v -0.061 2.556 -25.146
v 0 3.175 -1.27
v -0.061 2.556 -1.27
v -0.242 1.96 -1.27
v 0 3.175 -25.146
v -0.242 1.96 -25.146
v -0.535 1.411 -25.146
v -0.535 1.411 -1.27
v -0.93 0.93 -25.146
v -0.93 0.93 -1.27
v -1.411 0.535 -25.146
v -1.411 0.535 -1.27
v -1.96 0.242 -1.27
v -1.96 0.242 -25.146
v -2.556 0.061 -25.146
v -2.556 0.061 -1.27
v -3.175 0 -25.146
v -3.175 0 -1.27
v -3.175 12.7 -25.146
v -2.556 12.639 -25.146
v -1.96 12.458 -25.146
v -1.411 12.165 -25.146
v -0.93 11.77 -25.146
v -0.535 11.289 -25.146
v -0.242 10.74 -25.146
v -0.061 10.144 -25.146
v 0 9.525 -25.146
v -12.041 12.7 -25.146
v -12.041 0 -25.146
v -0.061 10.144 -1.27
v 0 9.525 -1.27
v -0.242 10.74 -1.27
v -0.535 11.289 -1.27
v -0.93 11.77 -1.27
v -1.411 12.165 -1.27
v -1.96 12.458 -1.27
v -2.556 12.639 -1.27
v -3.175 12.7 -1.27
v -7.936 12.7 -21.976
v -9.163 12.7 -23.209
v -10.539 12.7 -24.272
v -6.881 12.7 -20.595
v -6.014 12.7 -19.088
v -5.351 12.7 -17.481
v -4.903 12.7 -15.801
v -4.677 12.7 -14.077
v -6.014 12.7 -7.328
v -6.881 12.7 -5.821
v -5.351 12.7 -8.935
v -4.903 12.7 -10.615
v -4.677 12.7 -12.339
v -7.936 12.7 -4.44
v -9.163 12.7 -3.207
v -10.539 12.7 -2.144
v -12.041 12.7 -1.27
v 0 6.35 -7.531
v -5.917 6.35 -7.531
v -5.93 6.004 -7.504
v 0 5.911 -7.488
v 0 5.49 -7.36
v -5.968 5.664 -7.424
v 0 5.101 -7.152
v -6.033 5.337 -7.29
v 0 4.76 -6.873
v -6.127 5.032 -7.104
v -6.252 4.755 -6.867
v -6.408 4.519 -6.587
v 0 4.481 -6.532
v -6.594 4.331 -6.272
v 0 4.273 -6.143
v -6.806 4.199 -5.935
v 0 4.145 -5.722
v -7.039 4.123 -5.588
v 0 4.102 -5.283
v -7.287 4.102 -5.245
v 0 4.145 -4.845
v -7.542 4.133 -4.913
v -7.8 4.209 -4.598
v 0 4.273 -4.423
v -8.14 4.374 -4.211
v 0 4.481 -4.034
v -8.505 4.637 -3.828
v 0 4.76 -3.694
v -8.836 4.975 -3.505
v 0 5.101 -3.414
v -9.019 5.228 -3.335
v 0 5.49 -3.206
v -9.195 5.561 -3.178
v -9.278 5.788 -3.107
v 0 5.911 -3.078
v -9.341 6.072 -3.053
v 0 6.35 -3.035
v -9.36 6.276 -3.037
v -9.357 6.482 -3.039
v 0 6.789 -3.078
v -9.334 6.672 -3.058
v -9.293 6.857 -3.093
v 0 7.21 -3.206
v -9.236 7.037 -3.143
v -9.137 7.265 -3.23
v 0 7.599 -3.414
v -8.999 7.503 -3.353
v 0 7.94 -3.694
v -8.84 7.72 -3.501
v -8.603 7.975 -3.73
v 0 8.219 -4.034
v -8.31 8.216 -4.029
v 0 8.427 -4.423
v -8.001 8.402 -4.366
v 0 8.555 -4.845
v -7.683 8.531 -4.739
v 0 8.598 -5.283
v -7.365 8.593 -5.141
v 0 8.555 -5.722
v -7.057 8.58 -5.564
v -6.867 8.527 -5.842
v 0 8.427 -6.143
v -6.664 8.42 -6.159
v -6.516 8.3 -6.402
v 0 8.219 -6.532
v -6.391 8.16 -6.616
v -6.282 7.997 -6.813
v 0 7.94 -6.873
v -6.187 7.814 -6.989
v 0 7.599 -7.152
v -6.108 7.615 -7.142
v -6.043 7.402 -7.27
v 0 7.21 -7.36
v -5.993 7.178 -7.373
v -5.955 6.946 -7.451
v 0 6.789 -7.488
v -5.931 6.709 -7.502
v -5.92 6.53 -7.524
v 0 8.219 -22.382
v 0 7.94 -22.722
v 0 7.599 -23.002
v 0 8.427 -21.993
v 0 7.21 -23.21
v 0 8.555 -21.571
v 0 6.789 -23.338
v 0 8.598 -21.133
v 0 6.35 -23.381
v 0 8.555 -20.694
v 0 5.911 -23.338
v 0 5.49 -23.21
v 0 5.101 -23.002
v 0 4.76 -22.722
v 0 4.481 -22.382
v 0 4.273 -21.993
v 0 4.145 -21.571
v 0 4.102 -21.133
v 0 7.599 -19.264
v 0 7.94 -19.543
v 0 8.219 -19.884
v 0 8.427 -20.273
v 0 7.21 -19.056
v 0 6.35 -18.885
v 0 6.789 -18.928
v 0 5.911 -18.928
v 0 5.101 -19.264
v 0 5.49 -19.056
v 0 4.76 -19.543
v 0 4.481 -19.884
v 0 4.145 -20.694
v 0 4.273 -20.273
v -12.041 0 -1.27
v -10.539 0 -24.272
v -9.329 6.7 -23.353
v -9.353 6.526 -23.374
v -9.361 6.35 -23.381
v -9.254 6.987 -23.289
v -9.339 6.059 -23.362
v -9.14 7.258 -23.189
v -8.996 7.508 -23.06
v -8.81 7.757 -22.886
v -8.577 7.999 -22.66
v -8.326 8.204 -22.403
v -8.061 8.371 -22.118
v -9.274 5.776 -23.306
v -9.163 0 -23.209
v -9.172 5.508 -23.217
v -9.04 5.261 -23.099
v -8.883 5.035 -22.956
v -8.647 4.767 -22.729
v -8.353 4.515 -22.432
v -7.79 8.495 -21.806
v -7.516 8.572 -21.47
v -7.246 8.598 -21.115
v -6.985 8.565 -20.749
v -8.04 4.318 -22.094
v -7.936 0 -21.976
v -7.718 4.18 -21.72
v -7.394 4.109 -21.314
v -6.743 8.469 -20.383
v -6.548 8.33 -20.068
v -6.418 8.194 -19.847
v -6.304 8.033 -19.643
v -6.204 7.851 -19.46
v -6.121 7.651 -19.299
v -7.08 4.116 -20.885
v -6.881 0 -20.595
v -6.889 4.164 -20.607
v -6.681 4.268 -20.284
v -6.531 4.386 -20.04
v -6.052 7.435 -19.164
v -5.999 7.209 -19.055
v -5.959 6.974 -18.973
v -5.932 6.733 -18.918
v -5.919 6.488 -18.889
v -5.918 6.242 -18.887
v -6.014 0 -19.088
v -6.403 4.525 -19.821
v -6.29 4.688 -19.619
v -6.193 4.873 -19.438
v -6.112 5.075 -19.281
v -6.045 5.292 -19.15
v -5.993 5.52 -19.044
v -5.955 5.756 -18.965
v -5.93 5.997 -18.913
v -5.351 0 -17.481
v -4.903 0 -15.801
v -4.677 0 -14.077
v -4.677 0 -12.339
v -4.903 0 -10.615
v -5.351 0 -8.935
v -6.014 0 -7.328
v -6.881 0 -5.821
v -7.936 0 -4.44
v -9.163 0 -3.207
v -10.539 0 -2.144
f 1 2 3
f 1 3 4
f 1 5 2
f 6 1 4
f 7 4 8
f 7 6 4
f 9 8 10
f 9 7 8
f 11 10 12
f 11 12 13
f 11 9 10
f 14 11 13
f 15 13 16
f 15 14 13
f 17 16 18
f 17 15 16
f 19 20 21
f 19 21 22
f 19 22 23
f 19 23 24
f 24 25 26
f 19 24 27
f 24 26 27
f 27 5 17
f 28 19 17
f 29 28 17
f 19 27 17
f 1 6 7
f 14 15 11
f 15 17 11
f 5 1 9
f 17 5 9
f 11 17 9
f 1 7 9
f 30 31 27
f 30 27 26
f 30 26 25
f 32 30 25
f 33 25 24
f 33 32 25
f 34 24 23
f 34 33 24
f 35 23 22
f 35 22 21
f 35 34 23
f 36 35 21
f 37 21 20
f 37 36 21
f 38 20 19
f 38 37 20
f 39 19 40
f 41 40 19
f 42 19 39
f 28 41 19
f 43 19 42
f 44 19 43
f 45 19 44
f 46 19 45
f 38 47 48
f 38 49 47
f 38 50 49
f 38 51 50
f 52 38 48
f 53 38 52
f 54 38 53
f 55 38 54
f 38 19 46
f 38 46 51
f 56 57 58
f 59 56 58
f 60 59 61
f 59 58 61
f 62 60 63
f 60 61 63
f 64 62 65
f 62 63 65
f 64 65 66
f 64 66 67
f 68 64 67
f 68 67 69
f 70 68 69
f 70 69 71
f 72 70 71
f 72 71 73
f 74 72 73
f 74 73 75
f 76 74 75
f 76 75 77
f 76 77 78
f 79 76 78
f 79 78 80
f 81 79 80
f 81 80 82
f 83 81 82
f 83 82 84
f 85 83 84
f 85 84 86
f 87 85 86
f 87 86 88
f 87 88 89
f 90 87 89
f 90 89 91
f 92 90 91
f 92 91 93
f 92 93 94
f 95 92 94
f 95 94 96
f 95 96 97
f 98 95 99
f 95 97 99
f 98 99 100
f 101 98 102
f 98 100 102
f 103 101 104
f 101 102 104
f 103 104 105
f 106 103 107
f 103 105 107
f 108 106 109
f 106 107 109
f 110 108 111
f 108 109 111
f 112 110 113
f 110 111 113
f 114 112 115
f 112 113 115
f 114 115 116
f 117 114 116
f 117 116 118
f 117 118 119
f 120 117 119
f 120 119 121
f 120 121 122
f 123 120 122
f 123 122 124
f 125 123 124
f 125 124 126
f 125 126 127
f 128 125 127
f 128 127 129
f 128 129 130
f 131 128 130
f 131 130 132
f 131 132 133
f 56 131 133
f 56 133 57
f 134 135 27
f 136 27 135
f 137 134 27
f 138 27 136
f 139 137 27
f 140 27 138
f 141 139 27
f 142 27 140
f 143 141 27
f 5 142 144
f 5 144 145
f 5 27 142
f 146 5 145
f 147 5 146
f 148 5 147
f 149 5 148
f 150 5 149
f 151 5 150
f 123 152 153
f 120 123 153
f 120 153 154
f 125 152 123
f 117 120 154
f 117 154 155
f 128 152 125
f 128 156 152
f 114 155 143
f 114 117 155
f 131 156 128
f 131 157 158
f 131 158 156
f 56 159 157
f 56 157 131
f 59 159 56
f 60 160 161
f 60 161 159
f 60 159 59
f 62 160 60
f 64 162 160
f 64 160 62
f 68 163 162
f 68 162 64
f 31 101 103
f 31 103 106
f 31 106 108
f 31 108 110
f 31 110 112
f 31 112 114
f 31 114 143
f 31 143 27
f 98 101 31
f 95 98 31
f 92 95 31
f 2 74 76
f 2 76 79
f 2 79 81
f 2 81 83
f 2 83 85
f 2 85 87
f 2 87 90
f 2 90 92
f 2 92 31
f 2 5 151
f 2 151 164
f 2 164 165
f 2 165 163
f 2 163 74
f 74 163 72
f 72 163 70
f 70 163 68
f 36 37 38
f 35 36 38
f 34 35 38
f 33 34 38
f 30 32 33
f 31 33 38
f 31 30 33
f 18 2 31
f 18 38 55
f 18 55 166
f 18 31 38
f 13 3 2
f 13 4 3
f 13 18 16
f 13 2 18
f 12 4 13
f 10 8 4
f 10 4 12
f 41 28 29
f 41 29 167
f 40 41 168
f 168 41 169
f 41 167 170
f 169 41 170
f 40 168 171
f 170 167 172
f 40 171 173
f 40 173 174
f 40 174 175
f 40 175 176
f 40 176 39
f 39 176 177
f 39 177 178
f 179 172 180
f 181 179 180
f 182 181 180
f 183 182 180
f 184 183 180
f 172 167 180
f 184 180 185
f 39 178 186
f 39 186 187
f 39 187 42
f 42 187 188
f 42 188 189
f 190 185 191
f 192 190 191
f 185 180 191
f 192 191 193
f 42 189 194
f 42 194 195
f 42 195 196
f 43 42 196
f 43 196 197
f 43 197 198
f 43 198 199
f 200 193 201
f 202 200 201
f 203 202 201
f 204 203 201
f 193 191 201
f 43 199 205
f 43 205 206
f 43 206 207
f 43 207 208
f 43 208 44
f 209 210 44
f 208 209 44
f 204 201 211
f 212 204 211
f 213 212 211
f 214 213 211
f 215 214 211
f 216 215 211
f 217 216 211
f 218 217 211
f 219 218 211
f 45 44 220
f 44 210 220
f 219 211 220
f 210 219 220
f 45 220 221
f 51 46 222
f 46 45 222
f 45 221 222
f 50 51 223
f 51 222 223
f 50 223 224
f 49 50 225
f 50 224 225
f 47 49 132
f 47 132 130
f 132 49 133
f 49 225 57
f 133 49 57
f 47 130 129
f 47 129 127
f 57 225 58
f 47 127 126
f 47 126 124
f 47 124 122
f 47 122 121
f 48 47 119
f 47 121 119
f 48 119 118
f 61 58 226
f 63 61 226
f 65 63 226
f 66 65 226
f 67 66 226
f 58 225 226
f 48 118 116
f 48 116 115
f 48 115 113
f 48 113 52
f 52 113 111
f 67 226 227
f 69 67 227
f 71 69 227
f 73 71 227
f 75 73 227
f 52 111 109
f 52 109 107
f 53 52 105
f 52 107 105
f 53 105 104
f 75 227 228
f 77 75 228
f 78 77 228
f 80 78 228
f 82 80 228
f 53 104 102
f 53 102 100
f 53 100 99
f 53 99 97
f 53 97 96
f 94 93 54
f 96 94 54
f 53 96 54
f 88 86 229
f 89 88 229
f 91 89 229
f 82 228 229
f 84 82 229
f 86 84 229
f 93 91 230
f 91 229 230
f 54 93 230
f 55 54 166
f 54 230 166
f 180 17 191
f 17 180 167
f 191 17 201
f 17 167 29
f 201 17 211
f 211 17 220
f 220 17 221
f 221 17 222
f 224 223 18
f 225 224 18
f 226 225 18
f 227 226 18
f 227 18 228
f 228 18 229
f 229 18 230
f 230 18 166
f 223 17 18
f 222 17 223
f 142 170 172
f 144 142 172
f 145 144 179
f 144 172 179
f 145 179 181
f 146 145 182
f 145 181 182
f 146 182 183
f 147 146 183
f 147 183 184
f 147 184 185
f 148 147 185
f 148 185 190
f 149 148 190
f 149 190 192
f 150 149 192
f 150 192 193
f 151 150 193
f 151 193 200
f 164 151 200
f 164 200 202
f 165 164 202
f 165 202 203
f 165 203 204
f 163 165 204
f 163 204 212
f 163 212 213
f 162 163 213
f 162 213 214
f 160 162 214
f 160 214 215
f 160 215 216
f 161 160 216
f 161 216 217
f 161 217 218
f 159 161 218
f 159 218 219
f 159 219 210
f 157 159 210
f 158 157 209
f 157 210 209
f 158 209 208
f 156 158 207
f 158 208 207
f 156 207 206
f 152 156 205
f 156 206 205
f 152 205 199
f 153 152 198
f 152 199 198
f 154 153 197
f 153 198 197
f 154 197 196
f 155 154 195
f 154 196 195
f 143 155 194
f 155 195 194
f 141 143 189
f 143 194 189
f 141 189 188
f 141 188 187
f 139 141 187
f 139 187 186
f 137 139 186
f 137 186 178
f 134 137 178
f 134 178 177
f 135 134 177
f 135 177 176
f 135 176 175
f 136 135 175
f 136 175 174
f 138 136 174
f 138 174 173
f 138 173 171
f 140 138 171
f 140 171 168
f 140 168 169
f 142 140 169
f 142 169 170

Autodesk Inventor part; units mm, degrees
ref_plane "YZ Plane" through (0, 0, 0) normal (1, 0, 0) x (0, 1, 0)
ref_plane "XZ Plane" through (0, 0, 0) normal (0, 1, 0) x (-1, 0, 0)
ref_plane "XY Plane" through (0, 0, 0) normal (0, 0, 1) x (1, 0, 0)
sketch "Sketch1" plane through (0, 0, 0) normal (0, 1, 0) x (-1, 0, 0)
  line L0 (0, 0) -> (26.416, 0)
  line L1 (26.416, 0) -> (26.416, -26.416)
  line L2 (26.416, -26.416) -> (0, -26.416)
  line L3 (0, -26.416) -> (0, 0)
  line L4 (0, -13.208) -> (17.9832, -13.208)
  line L5 (0, -13.208) -> (17.9832, -13.208) construction
  circle A0 centre (17.9832, -13.208) radius 13.335
  point P0 (16.1472, 0)
  point P1 (16.1472, -26.416)
  dimension "d0" = 26.416
  dimension "d1" = 26.416
  dimension "d2" = 17.9832
  dimension "d3" = 0
  dimension "d4" = 26.67
extrude "Extrusion1" add sketch "Sketch1" along normal blind 12.7 contours L0 A0 L4 L3 | L4 A0 L2 L3
sketch "Sketch2" plane through (0, 0, 0) normal (1, 0, 0) x (0, 0, -1)
  line L0 (0, 12.7) -> (26.416, 12.7) projected
  line L1 (13.208, 12.7) -> (13.208, 6.35)
  line L2 (13.208, 12.7) -> (19.558, 12.7) construction
  line L3 (13.208, 6.35) -> (21.1328, 6.35)
  line L4 (13.208, 6.35) -> (21.1328, 6.35) construction
  line L5 (13.208, 6.35) -> (5.2832, 6.35)
  line L6 (13.208, 6.35) -> (21.1328, 6.35) construction
  point P0 (0, 0)
  dimension "d7" = 6.35
  dimension "d8" = 90
  dimension "d9" = 7.9248
  dimension "d10" = 0
  dimension "d11" = 7.9248
  dimension "d12" = 180
hole "Hole1" at (0, 6.35, -5.2832) at (0, 6.35, -21.1328) direction (-1, 0, 0) diameter 4.4958 depth 35 clearance for "Flat Head Machine Screw (82)" size "#8" standard "Ansi Unified Screw Threads"
fillet "Fillet1" radius 3.175 2 edges at (0, 12.7, -13.208) (0, 0, -13.208)
sketch "Sketch3" plane through (0, 3.175, -26.416) normal (1, 0, 0) x (0, 0, -1)
  line L0 (-26.416, 9.525) -> (0, 9.525) projected
  line L1 (-26.416, -3.175) -> (0, -3.175) projected
  line L2 (-26.416, 9.525) -> (-25.146, 9.525)
  line L3 (-25.146, 9.525) -> (-25.146, -3.175)
  line L4 (-25.146, -3.175) -> (-26.416, -3.175)
  line L5 (-26.416, -3.175) -> (-26.416, 9.525)
  line L6 (0, -3.175) -> (0, 9.525) projected
  line L7 (0, 9.525) -> (-1.27, 9.525)
  line L8 (-1.27, 9.525) -> (-1.27, -3.175)
  line L9 (-1.27, -3.175) -> (0, -3.175)
  line L10 (0, -3.175) -> (0, 9.525)
  point P0 (-1.27, 9.525)
  point P1 (-1.27, -3.175)
  dimension "d21" = 1.27
  dimension "d22" = 1.27
extrude "Extrusion2" cut sketch "Sketch3" against normal blind 25.4 contours L0 L3 L1 L5 | L0 L6 L1 L8
properties part number "CatchHolderNut"
